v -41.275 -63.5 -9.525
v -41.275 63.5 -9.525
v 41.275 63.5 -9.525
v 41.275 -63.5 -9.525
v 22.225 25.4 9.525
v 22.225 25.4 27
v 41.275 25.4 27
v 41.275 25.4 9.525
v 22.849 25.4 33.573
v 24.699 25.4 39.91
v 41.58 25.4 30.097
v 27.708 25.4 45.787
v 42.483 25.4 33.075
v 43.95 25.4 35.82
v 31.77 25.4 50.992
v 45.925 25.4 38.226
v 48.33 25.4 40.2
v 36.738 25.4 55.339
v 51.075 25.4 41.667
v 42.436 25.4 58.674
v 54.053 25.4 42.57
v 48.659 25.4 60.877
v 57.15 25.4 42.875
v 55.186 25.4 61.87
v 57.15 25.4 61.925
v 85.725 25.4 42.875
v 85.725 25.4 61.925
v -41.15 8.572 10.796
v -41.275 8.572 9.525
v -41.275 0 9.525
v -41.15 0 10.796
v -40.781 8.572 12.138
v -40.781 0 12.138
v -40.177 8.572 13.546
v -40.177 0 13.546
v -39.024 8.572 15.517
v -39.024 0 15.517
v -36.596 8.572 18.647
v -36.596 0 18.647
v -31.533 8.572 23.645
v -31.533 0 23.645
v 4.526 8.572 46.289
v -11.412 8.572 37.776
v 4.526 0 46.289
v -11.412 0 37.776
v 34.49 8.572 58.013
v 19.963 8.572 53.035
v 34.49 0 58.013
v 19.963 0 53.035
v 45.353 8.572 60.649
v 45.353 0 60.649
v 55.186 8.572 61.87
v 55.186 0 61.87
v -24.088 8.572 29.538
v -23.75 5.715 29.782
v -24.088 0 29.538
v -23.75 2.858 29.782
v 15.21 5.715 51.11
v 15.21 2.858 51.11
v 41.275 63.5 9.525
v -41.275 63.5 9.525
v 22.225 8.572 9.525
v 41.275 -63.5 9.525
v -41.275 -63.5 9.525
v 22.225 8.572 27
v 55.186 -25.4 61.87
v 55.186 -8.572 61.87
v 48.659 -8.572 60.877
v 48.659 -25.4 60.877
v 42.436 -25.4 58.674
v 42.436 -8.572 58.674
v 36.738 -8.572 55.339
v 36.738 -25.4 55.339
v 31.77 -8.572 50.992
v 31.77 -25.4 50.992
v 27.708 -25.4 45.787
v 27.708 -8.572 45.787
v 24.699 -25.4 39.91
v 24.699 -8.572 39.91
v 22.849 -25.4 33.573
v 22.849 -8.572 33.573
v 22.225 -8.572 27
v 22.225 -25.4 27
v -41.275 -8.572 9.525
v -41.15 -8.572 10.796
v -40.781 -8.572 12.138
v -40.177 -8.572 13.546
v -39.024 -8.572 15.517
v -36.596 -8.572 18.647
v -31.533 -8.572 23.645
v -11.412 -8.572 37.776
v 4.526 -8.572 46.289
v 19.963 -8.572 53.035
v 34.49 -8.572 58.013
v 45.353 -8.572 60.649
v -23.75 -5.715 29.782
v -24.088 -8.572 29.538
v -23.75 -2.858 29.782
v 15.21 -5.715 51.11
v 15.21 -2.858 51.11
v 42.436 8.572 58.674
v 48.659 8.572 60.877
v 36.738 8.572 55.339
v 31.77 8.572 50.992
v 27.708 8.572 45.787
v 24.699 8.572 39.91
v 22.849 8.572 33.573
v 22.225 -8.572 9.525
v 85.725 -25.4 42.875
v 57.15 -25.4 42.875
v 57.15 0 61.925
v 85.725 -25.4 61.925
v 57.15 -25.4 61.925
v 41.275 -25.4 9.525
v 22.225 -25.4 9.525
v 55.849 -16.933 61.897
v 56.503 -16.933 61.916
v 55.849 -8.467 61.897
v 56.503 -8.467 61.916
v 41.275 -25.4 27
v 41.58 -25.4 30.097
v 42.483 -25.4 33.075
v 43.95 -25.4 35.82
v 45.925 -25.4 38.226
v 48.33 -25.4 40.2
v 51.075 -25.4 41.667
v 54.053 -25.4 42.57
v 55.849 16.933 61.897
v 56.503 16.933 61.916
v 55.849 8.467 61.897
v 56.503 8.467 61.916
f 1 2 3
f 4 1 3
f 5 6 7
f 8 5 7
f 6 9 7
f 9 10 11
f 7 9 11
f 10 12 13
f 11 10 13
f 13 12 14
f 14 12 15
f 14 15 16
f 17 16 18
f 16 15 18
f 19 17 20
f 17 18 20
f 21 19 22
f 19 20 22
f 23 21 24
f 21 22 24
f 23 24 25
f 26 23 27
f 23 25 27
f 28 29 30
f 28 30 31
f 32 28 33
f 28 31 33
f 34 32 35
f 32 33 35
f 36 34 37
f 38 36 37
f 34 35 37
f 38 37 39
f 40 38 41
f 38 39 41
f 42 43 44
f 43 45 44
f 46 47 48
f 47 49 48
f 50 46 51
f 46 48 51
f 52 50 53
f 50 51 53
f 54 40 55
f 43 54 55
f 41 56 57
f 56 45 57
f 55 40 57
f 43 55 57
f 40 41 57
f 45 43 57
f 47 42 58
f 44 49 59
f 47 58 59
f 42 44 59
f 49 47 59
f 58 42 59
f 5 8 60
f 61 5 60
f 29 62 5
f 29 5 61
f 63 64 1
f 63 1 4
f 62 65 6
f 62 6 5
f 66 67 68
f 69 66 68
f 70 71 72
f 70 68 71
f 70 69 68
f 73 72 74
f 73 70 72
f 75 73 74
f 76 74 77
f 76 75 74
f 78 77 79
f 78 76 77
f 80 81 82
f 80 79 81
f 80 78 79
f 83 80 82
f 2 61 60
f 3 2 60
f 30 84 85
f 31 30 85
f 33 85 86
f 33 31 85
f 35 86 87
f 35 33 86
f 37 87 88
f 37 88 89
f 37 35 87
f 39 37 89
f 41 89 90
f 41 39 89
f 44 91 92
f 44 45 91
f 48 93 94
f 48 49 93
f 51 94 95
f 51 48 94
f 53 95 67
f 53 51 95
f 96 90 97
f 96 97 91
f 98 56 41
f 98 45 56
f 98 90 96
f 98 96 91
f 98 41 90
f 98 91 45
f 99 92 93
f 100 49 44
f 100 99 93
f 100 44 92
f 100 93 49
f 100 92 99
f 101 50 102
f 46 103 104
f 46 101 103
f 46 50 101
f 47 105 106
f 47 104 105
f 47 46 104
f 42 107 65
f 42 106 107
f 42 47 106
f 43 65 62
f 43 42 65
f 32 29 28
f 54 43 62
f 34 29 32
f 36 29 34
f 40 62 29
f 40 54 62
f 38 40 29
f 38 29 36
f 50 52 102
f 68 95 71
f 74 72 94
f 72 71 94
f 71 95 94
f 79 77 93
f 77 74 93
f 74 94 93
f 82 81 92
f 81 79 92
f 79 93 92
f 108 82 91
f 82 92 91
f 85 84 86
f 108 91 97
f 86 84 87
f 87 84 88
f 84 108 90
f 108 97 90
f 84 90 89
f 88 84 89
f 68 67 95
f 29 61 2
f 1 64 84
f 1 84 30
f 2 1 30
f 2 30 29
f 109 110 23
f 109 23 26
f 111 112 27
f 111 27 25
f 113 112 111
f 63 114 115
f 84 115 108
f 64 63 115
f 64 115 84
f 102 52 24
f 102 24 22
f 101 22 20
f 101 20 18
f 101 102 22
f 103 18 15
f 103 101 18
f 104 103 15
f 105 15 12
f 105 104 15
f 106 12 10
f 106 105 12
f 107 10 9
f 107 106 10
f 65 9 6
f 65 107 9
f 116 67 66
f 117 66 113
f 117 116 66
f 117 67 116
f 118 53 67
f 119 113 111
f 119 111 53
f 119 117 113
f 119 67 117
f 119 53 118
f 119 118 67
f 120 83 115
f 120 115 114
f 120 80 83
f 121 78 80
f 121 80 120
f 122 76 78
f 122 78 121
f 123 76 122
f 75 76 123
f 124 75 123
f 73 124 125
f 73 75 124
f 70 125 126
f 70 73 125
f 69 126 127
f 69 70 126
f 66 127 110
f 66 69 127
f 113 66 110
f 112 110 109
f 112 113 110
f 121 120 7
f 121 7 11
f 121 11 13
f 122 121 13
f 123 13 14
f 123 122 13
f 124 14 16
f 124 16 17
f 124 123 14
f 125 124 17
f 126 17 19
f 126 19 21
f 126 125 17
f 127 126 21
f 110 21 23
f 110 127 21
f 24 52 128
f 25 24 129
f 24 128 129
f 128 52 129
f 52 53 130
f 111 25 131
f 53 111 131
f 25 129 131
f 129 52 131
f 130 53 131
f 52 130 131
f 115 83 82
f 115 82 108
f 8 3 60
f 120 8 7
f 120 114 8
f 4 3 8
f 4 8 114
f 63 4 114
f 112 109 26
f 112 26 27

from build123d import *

# Parameters (mm, degrees)
F1_DEPTH = 63.5
F0_W     = 25.2919347882
F0_H     = 19.05
F2_DEPTH = 25.4
F3_DEPTH = 8.5725


with BuildPart() as f1:
    # F0 (on Front) → F1 (new body, symmetric)
    with BuildSketch(Plane.XZ):
        Polygon((22.225, 9.525), (-41.275, 9.525), (-41.275, -9.525), (41.275, -9.525), (41.275, 9.525), align=None)
    extrude(amount=F1_DEPTH, both=True)

    # F0 (on Front) → F2 (join, symmetric)
    with BuildSketch(Plane.XZ):
        with BuildLine():
            Line((22.225, 27.0002), (22.225, 9.525))
            Line((22.225, 9.525), (41.275, 9.525))
            Line((41.275, 9.525), (41.275, 27.0002))
            ThreePointArc((41.275, 27.0002), (45.9246798487, 38.2255201513), (57.15, 42.8752))
            Line((57.15, 42.8752), (60.4330652118, 42.8752))
            Line((60.4330652118, 42.8752), (60.4330652118, 61.9252))
            Line((60.4330652118, 61.9252), (57.15, 61.9252))
            add(Edge.make_bspline(
                [(55.1864649446, 61.8699598943), (55.8526018083, 61.9015411095), (56.5073505407, 61.9200895907), (57.15, 61.9252)],
                knots=[109.3417513955, 109.3417513955, 109.3417513955, 109.3417513955, 111.5045361635, 111.5045361635, 111.5045361635, 111.5045361635], degree=3))
            ThreePointArc((55.1864649446, 61.8699598943), (31.7695736165, 50.9916480929), (22.225, 27.0002))
        make_face()
        with Locations((73.0790326059, 52.4002)):
            Rectangle(F0_W, F0_H)
    extrude(amount=F2_DEPTH, both=True)

    # F0 (on Front) → F3 (join, symmetric)
    with BuildSketch(Plane.XZ):
        with BuildLine():
            add(Edge.make_bspline(
                [(-41.275, 9.525), (-41.275, 25.3662331122), (21.509248225, 60.2733399101), (55.1864649446, 61.8699598943)],
                knots=[0, 0, 0, 0, 109.3417513955, 109.3417513955, 109.3417513955, 109.3417513955], degree=3))
            Line((-41.275, 9.525), (22.225, 9.525))
            Line((22.225, 9.525), (22.225, 27.0002))
            ThreePointArc((22.225, 27.0002), (31.7695736165, 50.9916480929), (55.1864649446, 61.8699598943))
        make_face()
    extrude(amount=F3_DEPTH, both=True)


solid = f1.part
